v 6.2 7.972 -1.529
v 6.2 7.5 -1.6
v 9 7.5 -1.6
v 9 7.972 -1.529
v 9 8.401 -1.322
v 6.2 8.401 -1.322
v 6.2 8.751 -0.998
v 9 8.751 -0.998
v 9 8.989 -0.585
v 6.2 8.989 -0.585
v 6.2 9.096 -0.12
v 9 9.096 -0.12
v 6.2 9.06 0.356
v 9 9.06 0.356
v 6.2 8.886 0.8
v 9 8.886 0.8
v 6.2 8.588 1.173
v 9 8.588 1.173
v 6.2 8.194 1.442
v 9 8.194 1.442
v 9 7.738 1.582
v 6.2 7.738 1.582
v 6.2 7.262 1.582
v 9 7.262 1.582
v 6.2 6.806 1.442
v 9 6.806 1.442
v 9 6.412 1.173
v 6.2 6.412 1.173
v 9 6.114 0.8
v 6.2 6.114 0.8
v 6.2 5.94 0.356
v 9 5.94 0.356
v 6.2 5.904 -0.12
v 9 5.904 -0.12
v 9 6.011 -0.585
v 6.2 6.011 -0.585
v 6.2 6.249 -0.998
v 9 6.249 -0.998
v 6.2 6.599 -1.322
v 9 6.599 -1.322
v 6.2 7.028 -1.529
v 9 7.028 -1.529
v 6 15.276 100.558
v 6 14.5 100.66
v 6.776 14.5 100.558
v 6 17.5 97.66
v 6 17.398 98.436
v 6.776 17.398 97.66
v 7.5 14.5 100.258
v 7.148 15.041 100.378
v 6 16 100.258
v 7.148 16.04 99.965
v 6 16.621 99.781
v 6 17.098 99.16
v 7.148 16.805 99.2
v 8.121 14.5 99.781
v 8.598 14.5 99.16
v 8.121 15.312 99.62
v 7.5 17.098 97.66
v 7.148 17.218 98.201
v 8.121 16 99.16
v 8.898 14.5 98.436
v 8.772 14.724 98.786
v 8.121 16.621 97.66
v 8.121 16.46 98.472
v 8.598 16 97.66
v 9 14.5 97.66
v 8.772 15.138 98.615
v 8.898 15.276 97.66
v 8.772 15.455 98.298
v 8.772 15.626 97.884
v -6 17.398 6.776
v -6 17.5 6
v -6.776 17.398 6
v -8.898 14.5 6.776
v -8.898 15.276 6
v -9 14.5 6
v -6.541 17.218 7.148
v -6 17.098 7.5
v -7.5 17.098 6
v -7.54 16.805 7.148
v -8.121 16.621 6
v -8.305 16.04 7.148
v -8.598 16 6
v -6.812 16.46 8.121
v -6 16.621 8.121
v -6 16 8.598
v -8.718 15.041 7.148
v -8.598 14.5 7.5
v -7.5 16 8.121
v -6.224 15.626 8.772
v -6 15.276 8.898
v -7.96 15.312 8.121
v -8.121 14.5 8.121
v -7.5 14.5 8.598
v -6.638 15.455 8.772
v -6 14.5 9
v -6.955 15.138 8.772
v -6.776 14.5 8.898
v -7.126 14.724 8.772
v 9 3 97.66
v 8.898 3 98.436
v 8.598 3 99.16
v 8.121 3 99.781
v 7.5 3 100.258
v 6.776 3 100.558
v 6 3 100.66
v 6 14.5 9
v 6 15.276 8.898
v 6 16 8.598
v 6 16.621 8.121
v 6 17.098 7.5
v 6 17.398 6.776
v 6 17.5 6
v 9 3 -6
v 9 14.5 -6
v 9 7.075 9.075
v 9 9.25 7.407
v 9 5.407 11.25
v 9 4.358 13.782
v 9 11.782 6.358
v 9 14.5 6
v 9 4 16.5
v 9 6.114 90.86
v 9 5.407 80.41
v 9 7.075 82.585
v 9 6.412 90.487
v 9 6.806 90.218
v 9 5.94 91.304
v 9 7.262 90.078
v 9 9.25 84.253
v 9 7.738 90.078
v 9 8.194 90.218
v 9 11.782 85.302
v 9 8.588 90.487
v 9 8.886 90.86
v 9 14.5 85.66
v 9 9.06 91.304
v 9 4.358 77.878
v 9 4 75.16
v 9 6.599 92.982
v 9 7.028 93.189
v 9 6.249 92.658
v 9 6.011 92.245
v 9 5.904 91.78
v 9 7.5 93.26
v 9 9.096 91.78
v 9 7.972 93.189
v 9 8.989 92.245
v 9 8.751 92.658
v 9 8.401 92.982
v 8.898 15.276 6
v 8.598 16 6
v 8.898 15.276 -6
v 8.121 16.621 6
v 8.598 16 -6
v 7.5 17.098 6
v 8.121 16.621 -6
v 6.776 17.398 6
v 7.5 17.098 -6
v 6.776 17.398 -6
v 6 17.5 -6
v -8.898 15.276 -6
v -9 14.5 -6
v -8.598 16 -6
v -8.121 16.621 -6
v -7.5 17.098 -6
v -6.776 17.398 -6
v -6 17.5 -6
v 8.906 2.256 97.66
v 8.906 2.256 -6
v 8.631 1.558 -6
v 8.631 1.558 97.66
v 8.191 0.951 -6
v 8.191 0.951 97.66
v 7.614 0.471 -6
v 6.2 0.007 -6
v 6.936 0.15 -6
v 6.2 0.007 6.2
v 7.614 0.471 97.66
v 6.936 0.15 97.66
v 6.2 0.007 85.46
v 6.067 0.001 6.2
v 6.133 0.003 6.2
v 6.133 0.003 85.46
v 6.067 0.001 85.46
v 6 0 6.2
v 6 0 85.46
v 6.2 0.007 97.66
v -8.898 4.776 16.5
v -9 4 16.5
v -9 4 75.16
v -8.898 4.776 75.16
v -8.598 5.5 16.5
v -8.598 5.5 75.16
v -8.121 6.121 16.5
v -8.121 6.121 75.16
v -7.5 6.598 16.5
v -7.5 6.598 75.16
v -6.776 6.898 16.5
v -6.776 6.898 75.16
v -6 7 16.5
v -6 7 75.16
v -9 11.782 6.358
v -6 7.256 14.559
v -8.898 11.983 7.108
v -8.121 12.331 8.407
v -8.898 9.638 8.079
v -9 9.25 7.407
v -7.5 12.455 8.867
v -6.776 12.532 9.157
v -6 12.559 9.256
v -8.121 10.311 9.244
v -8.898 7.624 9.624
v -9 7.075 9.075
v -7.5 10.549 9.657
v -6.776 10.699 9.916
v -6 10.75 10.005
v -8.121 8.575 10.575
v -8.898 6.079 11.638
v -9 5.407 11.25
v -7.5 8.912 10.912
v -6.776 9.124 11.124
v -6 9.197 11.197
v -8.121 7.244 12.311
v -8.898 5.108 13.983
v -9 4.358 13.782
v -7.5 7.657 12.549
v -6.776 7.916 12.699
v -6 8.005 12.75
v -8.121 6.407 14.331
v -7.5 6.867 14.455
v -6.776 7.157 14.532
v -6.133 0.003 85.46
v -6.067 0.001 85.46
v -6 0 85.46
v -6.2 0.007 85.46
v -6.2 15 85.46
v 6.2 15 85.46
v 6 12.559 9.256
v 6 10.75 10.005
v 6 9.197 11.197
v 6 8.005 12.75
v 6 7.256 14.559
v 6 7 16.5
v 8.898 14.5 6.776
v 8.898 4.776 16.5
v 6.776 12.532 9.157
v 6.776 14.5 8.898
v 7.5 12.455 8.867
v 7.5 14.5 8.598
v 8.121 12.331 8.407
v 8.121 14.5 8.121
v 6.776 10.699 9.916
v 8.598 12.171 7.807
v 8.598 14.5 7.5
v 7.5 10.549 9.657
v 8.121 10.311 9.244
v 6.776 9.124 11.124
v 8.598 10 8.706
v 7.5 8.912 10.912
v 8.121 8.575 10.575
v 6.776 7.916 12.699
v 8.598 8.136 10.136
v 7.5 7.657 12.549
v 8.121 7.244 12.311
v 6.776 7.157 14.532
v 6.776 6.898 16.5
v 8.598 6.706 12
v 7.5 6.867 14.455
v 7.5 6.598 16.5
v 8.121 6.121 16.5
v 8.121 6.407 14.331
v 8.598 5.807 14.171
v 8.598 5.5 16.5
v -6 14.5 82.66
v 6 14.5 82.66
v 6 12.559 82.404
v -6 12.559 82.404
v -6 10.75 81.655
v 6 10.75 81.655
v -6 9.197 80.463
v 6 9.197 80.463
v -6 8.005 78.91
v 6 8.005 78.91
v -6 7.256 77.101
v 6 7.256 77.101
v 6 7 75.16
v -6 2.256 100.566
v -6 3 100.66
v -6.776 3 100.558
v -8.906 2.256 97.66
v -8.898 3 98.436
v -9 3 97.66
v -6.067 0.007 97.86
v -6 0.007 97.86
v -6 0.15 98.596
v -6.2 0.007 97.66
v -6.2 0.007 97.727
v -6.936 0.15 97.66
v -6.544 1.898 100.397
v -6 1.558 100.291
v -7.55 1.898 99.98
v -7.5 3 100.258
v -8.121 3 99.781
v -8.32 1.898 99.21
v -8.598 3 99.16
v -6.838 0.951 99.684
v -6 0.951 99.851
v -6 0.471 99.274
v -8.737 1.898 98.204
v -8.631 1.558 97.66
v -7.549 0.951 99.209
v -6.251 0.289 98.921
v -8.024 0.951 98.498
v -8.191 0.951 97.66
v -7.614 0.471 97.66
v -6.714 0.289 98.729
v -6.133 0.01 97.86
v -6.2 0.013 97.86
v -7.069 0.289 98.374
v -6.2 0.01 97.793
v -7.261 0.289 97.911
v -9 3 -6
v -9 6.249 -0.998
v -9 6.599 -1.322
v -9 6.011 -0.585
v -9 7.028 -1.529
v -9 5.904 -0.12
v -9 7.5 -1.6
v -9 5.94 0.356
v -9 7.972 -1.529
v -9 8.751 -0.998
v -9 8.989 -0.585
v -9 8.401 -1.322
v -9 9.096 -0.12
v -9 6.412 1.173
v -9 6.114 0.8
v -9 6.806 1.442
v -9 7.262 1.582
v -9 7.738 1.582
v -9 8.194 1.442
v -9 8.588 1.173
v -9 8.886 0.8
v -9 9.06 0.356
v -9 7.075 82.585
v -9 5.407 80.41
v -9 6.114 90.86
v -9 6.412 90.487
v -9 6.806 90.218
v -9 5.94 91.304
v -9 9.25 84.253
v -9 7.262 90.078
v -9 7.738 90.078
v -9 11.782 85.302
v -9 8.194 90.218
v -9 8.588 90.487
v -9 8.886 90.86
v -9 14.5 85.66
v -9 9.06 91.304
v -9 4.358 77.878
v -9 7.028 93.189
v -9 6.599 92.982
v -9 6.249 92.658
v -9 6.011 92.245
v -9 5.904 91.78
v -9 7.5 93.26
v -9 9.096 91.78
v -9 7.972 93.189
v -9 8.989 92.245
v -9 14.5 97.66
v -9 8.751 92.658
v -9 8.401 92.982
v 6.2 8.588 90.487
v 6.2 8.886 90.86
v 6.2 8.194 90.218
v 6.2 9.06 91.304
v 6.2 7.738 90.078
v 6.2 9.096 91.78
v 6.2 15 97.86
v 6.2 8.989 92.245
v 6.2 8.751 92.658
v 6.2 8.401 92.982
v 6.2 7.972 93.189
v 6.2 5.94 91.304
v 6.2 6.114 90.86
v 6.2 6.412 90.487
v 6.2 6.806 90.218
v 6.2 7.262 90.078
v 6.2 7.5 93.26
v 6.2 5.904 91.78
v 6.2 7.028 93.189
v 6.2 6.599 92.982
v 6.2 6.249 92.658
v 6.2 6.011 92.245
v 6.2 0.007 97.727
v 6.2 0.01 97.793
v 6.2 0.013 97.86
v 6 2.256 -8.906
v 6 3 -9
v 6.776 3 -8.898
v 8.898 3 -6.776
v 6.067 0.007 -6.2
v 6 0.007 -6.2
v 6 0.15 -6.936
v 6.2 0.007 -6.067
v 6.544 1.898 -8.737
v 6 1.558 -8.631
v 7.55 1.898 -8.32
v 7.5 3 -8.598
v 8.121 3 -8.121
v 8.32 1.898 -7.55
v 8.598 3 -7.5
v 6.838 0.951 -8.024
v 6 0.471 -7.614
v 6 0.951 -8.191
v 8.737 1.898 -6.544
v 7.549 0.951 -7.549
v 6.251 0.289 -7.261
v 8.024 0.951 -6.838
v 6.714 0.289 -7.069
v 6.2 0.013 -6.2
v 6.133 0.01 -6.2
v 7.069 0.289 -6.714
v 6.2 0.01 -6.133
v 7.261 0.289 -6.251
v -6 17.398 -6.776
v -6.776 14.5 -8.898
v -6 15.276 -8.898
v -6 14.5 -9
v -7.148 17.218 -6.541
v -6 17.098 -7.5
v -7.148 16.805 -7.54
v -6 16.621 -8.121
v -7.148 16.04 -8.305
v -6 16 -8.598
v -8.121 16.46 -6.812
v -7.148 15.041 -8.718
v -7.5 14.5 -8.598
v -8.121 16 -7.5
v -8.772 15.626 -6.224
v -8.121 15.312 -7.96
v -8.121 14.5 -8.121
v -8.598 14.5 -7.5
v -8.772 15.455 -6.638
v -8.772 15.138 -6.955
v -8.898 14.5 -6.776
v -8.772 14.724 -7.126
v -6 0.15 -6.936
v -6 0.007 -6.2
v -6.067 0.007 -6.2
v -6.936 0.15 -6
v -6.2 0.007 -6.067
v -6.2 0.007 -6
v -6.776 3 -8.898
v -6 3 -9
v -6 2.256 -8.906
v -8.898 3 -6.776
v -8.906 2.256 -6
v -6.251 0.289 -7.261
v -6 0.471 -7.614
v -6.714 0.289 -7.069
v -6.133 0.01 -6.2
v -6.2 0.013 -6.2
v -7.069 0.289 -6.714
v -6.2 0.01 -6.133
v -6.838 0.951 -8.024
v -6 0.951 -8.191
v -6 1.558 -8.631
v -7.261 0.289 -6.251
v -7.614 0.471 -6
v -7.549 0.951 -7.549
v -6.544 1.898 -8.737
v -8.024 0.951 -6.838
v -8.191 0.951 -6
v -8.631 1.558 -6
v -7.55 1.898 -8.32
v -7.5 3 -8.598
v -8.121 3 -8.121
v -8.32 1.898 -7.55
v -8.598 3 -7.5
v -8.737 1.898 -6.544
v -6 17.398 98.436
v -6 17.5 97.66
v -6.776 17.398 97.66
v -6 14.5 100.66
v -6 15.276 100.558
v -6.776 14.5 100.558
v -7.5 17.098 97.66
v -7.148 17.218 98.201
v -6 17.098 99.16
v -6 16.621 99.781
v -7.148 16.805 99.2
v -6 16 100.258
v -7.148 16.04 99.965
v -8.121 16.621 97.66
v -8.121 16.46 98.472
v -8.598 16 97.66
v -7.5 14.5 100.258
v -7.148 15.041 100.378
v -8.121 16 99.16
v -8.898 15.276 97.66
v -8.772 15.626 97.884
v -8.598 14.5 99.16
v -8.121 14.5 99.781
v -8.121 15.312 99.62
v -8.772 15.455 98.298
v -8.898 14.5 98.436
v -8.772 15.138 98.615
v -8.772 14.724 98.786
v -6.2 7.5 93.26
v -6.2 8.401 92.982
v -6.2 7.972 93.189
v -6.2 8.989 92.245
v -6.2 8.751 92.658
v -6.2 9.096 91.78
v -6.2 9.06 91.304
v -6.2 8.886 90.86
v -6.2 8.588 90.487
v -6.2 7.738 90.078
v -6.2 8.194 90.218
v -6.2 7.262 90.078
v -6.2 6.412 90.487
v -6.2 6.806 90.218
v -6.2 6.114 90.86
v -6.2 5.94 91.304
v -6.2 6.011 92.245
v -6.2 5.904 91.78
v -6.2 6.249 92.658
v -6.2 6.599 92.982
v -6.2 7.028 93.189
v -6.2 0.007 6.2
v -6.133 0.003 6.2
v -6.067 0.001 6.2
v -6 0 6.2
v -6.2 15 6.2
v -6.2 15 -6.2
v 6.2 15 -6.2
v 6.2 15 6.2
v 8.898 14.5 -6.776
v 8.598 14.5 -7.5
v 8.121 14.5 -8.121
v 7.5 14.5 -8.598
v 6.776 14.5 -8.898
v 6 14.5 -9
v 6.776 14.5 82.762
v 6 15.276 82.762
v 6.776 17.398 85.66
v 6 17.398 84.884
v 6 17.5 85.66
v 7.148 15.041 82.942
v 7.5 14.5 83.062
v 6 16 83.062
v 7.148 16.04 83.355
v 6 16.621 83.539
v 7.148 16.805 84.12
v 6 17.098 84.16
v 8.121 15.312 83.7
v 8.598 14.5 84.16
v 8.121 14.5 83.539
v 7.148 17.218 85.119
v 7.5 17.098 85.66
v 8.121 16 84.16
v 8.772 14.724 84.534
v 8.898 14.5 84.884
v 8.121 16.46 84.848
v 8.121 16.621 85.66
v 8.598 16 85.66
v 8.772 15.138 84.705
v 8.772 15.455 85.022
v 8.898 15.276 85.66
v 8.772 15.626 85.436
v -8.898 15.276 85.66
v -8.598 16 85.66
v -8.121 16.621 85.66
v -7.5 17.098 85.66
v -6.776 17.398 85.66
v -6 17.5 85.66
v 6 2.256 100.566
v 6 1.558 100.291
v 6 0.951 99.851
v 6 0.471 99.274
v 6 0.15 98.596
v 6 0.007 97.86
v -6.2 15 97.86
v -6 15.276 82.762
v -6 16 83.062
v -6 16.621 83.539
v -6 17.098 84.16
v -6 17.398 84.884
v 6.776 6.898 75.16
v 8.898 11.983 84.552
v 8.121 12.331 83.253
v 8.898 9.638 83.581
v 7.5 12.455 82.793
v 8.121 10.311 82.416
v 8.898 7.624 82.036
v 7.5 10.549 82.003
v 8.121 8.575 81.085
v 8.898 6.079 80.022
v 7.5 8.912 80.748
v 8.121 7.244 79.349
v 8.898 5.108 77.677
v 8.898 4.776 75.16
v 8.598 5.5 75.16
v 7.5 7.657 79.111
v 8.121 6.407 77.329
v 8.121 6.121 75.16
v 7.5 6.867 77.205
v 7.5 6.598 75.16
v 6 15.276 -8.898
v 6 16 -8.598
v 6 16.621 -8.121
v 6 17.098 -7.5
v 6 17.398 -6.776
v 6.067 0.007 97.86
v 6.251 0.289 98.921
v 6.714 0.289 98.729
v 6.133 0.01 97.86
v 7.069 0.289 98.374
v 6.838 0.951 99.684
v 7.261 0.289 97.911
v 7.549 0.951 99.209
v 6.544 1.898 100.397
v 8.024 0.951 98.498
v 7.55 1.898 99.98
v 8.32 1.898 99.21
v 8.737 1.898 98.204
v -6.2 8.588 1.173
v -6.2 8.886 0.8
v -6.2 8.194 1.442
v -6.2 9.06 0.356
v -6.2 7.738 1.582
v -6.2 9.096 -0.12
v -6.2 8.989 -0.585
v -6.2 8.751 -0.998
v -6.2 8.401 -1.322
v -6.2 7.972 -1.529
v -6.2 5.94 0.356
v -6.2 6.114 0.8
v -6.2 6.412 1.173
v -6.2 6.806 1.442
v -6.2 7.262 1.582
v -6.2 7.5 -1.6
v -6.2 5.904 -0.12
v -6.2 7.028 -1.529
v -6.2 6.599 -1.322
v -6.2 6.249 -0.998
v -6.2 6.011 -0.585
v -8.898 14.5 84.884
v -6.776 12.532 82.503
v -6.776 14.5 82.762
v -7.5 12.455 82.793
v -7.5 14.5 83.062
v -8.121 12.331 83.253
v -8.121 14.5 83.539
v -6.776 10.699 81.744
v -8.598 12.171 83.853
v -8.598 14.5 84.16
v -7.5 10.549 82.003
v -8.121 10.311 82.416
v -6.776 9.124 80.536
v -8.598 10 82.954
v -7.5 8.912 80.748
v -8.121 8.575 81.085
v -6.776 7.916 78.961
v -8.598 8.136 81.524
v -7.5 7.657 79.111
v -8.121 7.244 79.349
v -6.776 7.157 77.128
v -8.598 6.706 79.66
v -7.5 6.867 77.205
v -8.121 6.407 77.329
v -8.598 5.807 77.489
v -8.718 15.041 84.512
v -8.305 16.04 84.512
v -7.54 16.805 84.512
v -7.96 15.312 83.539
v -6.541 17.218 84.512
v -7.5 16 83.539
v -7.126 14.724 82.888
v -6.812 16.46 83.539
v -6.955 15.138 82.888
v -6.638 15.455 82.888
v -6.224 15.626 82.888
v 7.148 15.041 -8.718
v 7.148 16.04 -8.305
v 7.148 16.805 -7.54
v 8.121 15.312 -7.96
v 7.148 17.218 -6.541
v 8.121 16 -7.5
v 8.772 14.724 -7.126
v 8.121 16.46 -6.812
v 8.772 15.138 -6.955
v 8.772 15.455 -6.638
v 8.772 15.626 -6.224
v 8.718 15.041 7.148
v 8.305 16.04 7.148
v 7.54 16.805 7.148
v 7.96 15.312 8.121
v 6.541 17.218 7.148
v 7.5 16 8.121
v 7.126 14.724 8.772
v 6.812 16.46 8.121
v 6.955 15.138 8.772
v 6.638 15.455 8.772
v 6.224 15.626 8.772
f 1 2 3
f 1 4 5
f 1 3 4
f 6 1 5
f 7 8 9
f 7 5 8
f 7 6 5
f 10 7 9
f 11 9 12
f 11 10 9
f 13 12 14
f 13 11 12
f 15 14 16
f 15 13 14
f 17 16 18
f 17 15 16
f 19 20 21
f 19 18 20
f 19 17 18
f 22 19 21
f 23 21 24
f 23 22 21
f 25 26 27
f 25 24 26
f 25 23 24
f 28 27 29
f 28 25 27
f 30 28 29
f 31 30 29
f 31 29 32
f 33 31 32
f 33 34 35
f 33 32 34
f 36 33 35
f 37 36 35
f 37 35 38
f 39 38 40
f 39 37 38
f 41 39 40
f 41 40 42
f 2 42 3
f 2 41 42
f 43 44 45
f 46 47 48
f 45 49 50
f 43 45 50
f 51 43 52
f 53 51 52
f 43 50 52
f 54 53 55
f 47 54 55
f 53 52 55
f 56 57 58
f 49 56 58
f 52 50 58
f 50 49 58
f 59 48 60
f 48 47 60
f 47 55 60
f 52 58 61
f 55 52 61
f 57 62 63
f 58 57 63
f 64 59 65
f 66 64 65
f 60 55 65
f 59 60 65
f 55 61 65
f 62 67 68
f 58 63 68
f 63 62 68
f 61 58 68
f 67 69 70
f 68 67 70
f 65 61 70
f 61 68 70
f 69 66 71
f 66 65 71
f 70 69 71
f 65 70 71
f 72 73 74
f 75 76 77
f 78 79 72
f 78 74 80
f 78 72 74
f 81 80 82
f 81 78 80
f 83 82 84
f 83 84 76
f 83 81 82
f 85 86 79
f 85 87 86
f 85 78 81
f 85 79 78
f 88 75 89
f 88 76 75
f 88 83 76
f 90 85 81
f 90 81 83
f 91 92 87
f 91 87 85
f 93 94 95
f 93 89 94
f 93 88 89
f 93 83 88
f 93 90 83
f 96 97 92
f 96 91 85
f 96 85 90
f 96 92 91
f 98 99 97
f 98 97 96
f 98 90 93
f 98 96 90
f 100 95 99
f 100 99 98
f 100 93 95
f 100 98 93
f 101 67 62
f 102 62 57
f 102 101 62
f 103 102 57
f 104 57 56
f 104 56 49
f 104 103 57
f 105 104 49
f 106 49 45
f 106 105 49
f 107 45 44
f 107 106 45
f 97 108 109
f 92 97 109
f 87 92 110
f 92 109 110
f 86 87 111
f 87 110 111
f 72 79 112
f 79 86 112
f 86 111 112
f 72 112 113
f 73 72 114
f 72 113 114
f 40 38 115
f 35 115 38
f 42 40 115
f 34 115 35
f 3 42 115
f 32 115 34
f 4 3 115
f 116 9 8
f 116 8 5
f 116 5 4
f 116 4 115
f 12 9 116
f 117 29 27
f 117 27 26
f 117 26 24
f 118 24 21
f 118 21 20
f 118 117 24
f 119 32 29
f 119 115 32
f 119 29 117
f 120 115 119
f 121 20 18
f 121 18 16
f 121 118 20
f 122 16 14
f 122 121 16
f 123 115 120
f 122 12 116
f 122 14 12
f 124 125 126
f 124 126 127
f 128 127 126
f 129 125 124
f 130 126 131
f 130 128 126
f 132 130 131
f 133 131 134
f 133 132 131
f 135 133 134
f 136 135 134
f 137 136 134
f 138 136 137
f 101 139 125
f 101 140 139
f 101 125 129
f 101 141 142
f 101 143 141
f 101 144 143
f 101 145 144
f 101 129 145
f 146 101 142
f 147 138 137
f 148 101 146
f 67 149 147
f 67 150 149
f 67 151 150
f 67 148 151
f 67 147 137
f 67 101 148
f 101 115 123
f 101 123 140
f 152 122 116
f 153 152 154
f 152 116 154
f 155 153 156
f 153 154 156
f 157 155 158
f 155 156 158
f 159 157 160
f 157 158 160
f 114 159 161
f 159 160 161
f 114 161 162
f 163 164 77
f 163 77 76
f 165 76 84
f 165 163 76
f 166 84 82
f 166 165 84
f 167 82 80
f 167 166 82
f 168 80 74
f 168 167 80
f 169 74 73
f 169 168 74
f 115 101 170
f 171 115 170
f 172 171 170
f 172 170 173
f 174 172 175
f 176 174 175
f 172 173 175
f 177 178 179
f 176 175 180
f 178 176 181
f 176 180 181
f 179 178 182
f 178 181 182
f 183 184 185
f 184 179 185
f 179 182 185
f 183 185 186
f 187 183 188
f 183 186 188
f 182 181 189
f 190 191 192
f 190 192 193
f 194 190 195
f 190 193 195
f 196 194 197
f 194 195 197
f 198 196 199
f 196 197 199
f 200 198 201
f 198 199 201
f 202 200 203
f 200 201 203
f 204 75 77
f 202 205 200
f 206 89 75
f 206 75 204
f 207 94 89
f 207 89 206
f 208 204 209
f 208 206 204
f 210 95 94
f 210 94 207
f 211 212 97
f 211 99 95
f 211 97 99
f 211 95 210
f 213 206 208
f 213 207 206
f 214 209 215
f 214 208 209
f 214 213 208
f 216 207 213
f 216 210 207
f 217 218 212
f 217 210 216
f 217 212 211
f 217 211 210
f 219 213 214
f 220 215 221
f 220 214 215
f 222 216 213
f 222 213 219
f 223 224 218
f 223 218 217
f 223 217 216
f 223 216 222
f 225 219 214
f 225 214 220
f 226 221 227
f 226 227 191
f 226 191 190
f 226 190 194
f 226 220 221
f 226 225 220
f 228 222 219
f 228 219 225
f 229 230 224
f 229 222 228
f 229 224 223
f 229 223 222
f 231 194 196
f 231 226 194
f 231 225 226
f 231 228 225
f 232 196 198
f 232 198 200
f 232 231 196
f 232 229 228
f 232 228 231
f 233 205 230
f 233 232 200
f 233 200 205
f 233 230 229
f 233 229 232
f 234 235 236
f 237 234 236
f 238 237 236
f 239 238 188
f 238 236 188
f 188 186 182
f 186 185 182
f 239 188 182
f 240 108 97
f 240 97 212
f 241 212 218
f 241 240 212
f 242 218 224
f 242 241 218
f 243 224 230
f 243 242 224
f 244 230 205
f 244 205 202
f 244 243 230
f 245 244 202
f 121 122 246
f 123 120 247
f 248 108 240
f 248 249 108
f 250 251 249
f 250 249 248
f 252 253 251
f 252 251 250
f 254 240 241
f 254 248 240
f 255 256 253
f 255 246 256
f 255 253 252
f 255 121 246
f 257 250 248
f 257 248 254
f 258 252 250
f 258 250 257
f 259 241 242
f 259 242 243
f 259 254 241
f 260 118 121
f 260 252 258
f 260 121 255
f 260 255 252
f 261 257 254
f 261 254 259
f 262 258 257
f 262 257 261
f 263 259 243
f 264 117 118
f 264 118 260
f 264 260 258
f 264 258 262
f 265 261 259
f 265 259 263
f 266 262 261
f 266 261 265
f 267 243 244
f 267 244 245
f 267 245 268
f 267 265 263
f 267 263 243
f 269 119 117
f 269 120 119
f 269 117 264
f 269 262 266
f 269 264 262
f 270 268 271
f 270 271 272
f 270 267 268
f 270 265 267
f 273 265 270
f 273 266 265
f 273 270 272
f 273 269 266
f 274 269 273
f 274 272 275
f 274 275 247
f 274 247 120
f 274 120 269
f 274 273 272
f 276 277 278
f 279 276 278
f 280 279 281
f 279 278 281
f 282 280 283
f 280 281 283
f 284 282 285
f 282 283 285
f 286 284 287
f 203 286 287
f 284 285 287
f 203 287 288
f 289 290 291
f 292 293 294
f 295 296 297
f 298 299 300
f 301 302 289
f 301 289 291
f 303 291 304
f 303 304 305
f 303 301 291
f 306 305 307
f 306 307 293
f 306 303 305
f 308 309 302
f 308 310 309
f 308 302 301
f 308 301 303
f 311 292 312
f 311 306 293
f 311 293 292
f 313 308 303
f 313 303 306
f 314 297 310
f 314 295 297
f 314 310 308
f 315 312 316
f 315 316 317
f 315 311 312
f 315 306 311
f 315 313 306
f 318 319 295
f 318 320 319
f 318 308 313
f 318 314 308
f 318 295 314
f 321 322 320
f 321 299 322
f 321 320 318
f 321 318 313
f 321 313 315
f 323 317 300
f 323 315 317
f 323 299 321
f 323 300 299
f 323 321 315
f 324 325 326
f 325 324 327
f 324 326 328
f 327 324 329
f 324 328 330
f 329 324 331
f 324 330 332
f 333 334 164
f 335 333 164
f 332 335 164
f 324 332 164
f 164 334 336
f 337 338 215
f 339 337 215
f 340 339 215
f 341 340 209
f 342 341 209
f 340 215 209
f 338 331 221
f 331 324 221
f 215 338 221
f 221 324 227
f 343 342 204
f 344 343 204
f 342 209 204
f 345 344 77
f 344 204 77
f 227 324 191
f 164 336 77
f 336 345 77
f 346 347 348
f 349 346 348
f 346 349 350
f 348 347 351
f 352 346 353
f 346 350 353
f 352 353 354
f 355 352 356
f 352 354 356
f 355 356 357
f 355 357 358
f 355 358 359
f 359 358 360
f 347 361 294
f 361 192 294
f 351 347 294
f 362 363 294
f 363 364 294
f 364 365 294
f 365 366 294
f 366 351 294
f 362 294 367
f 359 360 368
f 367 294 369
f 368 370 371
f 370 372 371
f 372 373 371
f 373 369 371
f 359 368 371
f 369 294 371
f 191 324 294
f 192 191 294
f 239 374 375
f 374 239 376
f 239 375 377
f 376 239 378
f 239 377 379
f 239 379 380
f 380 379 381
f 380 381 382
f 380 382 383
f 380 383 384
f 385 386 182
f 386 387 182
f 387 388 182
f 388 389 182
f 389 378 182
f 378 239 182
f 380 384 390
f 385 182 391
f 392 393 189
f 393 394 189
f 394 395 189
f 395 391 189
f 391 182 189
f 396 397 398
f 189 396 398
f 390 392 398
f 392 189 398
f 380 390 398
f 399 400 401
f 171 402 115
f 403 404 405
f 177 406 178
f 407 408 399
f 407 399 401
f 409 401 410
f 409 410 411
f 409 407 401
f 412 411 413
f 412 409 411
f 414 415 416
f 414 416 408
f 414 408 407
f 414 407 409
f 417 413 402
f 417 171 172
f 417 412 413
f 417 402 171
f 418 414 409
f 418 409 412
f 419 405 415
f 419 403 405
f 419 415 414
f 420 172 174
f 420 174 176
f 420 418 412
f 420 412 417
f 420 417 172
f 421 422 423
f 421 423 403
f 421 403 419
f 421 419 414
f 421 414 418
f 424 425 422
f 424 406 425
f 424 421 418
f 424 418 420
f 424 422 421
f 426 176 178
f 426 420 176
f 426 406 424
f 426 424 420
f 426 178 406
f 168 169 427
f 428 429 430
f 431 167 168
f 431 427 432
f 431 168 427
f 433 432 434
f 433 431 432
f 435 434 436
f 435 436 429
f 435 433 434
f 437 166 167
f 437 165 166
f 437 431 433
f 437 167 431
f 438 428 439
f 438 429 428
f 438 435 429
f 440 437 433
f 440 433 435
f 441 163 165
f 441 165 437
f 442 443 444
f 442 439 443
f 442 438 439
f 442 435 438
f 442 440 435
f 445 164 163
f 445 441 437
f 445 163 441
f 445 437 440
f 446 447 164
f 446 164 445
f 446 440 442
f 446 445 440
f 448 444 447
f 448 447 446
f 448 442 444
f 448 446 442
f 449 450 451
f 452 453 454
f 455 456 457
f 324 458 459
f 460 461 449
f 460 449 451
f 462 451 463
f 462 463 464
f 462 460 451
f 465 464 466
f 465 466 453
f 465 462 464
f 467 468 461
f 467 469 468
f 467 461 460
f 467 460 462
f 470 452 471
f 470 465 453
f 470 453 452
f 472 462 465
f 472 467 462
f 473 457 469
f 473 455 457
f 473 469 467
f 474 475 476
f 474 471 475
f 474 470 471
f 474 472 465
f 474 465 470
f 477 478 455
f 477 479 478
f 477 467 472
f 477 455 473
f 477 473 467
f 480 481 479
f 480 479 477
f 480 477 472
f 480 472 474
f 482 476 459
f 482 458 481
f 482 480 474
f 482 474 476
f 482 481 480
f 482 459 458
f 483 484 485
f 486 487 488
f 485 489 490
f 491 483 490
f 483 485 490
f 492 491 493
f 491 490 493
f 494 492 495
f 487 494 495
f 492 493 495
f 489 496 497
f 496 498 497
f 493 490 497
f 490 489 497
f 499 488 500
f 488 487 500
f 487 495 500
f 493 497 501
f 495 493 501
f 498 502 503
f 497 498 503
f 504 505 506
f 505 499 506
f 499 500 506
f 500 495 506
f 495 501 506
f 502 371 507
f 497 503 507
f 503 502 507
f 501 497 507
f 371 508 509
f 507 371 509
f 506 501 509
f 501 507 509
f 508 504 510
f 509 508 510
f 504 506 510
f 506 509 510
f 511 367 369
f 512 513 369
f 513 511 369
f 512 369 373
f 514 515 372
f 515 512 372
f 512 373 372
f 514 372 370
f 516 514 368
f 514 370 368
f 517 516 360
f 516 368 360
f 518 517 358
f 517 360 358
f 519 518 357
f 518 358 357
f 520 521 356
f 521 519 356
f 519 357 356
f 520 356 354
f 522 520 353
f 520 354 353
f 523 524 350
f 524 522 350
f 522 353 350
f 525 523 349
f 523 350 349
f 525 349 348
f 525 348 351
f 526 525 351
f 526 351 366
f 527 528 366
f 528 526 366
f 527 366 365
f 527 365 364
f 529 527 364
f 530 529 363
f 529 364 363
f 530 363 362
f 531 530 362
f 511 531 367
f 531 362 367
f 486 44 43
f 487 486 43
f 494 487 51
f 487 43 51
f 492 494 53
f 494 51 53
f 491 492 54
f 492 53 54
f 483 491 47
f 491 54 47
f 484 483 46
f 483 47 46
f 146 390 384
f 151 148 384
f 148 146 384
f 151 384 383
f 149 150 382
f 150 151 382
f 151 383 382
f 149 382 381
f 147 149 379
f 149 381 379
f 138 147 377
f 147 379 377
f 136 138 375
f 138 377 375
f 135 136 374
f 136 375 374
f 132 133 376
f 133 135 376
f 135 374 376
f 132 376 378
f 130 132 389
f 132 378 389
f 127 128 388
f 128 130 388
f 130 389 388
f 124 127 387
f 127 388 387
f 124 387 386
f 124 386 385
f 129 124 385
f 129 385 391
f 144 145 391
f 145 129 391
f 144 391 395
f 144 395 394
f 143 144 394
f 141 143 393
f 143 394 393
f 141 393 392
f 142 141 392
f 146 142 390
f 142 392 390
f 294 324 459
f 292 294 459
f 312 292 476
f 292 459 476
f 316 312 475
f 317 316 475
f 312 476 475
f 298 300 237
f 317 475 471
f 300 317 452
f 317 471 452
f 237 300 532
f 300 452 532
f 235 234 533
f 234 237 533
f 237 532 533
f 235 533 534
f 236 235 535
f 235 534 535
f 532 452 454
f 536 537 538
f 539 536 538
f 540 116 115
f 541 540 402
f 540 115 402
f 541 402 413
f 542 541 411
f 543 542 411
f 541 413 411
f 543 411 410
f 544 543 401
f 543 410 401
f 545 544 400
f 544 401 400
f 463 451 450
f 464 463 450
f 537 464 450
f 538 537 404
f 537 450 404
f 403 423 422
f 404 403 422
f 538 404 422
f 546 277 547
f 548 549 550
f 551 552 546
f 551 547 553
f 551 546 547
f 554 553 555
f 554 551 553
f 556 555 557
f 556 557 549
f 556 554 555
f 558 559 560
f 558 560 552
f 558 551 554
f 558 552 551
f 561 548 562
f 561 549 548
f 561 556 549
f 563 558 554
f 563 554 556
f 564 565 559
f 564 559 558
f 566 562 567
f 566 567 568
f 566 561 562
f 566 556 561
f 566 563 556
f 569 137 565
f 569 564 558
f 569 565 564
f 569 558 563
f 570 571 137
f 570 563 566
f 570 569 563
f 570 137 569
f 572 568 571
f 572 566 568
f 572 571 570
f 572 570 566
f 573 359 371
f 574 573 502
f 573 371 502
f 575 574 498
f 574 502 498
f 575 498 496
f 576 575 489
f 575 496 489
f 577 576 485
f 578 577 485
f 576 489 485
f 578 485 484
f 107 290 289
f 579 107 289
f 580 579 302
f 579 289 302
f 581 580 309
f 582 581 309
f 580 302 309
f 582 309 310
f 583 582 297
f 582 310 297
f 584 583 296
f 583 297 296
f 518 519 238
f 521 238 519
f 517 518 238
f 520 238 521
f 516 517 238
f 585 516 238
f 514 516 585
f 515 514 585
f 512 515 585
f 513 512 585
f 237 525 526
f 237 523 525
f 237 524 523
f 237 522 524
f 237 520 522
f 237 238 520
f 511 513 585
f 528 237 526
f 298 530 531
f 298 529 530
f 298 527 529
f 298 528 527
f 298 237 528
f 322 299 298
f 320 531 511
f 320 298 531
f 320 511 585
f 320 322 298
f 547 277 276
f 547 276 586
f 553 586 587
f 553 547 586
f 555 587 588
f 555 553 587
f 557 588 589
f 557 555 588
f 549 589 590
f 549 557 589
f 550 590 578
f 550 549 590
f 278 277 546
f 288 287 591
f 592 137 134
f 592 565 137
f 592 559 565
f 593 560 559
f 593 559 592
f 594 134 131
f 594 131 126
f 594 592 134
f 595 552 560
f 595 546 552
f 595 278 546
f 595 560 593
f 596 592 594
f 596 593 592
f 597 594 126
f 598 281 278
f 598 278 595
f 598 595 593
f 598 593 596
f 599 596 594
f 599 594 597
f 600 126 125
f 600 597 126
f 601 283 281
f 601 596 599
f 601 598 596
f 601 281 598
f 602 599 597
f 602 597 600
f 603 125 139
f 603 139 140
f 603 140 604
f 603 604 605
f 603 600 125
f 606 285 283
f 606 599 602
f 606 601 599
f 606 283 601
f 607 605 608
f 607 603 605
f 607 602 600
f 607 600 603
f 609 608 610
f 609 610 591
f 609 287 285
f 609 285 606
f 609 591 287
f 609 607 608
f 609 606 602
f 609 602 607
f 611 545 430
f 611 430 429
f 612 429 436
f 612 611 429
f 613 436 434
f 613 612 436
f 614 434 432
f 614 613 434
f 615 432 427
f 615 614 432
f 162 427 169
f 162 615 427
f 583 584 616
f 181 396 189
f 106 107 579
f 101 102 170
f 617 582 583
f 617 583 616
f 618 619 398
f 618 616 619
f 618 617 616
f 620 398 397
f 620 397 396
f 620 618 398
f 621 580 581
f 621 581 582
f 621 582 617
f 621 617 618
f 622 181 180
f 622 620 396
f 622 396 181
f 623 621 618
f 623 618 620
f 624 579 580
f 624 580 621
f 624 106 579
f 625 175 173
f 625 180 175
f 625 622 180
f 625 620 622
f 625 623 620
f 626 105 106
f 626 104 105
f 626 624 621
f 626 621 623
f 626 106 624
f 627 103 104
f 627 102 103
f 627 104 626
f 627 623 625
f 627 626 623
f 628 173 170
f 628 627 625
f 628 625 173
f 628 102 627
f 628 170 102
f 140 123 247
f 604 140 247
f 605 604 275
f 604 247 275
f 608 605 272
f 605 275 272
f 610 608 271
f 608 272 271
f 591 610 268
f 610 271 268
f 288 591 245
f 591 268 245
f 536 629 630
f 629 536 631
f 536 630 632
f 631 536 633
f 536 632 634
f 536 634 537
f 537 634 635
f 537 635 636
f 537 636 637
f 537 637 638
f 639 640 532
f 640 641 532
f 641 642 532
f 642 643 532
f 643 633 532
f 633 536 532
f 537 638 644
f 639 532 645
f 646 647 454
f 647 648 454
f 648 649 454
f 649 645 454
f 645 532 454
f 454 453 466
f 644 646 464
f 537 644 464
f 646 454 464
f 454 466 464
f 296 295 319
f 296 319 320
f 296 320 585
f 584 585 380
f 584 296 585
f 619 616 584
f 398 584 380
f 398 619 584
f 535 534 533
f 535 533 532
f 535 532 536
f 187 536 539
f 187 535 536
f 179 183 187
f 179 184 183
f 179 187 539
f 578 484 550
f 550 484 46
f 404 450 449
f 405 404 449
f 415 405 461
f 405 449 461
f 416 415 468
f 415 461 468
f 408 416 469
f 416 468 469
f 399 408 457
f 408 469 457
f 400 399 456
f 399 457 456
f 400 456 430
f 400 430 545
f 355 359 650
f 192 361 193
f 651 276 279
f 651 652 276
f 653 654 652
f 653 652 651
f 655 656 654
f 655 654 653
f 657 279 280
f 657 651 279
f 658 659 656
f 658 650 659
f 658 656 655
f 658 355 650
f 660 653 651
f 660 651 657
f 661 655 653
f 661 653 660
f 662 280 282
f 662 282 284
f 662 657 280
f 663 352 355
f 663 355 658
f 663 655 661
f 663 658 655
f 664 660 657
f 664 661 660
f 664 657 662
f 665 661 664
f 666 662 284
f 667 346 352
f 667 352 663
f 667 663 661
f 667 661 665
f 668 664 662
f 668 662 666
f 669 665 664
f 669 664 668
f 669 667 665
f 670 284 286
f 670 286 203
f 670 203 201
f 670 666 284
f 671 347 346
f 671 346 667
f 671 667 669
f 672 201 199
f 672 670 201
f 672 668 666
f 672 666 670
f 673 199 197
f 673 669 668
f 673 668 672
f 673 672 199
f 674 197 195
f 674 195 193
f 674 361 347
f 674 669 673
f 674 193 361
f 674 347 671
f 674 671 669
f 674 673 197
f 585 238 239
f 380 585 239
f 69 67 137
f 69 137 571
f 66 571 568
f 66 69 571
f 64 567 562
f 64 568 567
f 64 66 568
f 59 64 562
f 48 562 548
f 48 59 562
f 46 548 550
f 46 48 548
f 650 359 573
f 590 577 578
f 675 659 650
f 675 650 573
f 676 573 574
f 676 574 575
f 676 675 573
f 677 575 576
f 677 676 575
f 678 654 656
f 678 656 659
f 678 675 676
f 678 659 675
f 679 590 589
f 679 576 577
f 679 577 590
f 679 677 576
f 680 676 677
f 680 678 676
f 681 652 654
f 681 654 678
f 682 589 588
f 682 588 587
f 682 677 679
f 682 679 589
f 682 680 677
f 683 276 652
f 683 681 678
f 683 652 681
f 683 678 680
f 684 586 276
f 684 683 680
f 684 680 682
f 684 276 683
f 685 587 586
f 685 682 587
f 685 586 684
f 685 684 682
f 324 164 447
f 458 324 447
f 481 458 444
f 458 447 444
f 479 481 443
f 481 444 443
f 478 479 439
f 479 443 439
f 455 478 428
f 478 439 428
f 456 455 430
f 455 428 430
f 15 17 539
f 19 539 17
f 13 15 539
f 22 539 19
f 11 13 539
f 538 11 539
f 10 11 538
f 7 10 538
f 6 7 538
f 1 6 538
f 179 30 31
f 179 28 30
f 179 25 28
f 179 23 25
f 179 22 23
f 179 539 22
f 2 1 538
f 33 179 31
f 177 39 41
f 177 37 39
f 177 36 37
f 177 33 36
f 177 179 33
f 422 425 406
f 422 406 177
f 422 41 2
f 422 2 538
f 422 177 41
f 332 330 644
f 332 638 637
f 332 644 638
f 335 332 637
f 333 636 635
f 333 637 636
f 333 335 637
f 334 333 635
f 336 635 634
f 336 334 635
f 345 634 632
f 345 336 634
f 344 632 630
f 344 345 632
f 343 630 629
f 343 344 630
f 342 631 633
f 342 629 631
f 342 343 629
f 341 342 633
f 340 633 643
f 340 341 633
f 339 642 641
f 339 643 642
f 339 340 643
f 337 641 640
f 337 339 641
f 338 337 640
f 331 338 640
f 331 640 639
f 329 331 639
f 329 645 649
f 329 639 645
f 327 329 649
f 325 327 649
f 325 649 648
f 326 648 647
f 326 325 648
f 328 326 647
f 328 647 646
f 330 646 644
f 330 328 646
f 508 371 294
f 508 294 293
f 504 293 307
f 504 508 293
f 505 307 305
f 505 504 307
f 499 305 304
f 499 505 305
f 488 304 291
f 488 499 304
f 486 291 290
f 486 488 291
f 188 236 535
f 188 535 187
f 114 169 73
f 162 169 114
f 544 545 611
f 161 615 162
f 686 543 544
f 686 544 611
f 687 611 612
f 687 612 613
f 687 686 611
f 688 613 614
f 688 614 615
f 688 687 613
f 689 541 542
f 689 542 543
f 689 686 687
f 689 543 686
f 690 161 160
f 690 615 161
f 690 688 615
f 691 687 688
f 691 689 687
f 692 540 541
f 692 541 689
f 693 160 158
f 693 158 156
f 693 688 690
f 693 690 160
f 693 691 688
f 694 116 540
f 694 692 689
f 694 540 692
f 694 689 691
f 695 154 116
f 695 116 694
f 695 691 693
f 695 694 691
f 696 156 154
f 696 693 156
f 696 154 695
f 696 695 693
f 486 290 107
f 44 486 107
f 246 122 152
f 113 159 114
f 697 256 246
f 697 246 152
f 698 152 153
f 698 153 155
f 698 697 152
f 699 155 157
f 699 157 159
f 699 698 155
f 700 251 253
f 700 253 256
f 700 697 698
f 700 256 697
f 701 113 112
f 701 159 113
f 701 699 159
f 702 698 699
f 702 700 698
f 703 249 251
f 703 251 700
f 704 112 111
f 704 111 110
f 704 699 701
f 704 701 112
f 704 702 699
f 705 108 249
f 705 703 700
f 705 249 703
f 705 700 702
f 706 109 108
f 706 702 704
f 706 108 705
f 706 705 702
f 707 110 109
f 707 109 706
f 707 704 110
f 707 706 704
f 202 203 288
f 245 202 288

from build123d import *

# Parameters (mm, degrees)
SKETCH_1_W               = 18
SKETCH_1_H               = 18
SKETCH_1_W_2             = 12.4
SKETCH_1_H_2             = 12.4
EXTRUDE_1_DEPTH          = 15
SKETCH_2_W               = 18
SKETCH_2_H               = 18
EXTRUDE_1_2_DEPTH        = 2.5
FILLET_1_R               = 3
SKETCH_3_W               = 18
SKETCH_3_H               = 7
EXTRUDE_2_DEPTH          = 36.83
FILLET_2_R               = 7.5
FILLET_3_R               = 3
CUT_EXTRUDE_1_DEPTH      = 37
CUT_EXTRUDE_1_DEPTH_BACK = 37
SKETCH_6_R               = 1.6
FILLET_4_R               = 3


# Some blends are built 0.0001 mm under size
with BuildPart() as part:
    # 草图1 → Extrude 1 (new body)
    with BuildSketch(Plane(origin=(0, 0, 0), x_dir=(1, 0, 0), z_dir=(0, 1, 0))):
        Rectangle(SKETCH_1_W, SKETCH_1_H)
        Rectangle(SKETCH_1_W_2, SKETCH_1_H_2, mode=Mode.SUBTRACT)
    extrude(amount=EXTRUDE_1_DEPTH)

    # 草图2 → Extrude 1 2 (add)
    with BuildSketch(Plane(origin=(0, 15, 0), x_dir=(1, 0, 0), z_dir=(0, 1, 0))):
        Rectangle(SKETCH_2_W, SKETCH_2_H)
    extrude(amount=EXTRUDE_1_2_DEPTH)

    # 圆角1
    fillet_1_edges = [part.edges().sort_by_distance(p)[0] for p in [
        (-9, 17.5, 0),
        (0, 17.5, 9),
        (9, 17.5, 0),
        (0, 17.5, -9),
    ]]
    fillet(fillet_1_edges, radius=FILLET_1_R)

    # 草图3 → 凸台-拉伸2 (add)
    with BuildSketch(Plane.XY.offset(9)):
        with Locations((0, 3.5)):
            Rectangle(SKETCH_3_W, SKETCH_3_H)
    extrude(amount=EXTRUDE_2_DEPTH)

    # 圆角2
    fillet_2_edges = [part.edges().sort_by_distance(p)[0] for p in [
        (0, 7, 9),
    ]]
    fillet(fillet_2_edges, radius=FILLET_2_R - 0.0001)  # a hair under: the kernel refuses the full size

    # 圆角3
    # the kernel refuses this fillet: 3 mm, written as the material it takes off along each edge
    with BuildSketch(Plane(origin=(6, 14.5, -6), x_dir=(0, 0, -1), z_dir=(1, 0, 0))) as fillet_3_piece_1_section:
        Polygon((0, 0), (FILLET_3_R, 0), (FILLET_3_R, FILLET_3_R), (0, FILLET_3_R), align=None)
    fillet_3_piece_1 = extrude(amount=FILLET_3_R, mode=Mode.PRIVATE)
    fillet_3_piece_1 = fillet_3_piece_1 - Plane(origin=(6, 14.5, -6), x_dir=(0, -0.7071067811865475, 0.7071067811865475), z_dir=(1, 0, 0)) * Sphere(FILLET_3_R, mode=Mode.PRIVATE)
    add(fillet_3_piece_1, mode=Mode.SUBTRACT)
    with BuildSketch(Plane(origin=(-6, 14.5, -6), x_dir=(0, 0, -1), z_dir=(-1, 0, 0))) as fillet_3_piece_2_section:
        Polygon((0, 0), (FILLET_3_R, 0), (FILLET_3_R, -FILLET_3_R), (0, -FILLET_3_R), align=None)
    fillet_3_piece_2 = extrude(amount=FILLET_3_R, mode=Mode.PRIVATE)
    fillet_3_piece_2 = fillet_3_piece_2 - Plane(origin=(-6, 14.5, -6), x_dir=(0, -0.7071067811865475, 0.7071067811865475), z_dir=(-1, 0, 0)) * Sphere(FILLET_3_R, mode=Mode.PRIVATE)
    add(fillet_3_piece_2, mode=Mode.SUBTRACT)
    with BuildSketch(Plane(origin=(-9, 14.5, -9), x_dir=(0, 0, 1), z_dir=(0, -1, 0)), Plane(origin=(9, -7.5, -9), x_dir=(0, 0, 1), z_dir=(0, 1, 0))) as fillet_3_piece_3:
        with BuildLine():
            CenterArc((FILLET_3_R, -FILLET_3_R), FILLET_3_R, 90, 90)
            Line((0, -FILLET_3_R), (0, 0))
            Line((0, 0), (FILLET_3_R, 0))
        make_face()
    extrude(amount=22, mode=Mode.SUBTRACT)

    # 草图6 → 切除-拉伸1 (cut, two sides: drawn at the far end of the back side and taken through both)
    with BuildSketch(Plane(origin=(-6.2, 0, 0), x_dir=(0, 0, -1), z_dir=(1, 0, 0)).offset(-CUT_EXTRUDE_1_DEPTH_BACK)):
        with Locations((0, 7.5)):
            Circle(SKETCH_6_R)
    extrude(amount=CUT_EXTRUDE_1_DEPTH + CUT_EXTRUDE_1_DEPTH_BACK, mode=Mode.SUBTRACT)

    # 镜向1: part across plane


with BuildPart() as part_1:
    add(part.part)
    add(part.part.mirror(Plane(origin=(0, 0, 45.83), x_dir=(1, 0, 0), z_dir=(0, 0, -1))))

    # 圆角4
    # the kernel refuses this fillet: 3 mm, written as the material it takes off along each edge
    with BuildSketch(Plane(origin=(6, 14.5, 85.66), x_dir=(0, 0, -1), z_dir=(1, 0, 0))) as fillet_4_piece_1_section:
        Polygon((0, 0), (FILLET_4_R, 0), (FILLET_4_R, FILLET_4_R), (0, FILLET_4_R), align=None)
    fillet_4_piece_1 = extrude(amount=FILLET_4_R, mode=Mode.PRIVATE)
    fillet_4_piece_1 = fillet_4_piece_1 - Plane(origin=(6, 14.5, 85.66), x_dir=(0, -0.7071067811865475, 0.7071067811865475), z_dir=(1, 0, 0)) * Sphere(FILLET_4_R, mode=Mode.PRIVATE)
    add(fillet_4_piece_1, mode=Mode.SUBTRACT)
    with BuildSketch(Plane(origin=(6, 14.5, 6), x_dir=(1, 0, 0), z_dir=(0, 0, 1))) as fillet_4_piece_2_section:
        Polygon((0, 0), (FILLET_4_R, 0), (FILLET_4_R, FILLET_4_R), (0, FILLET_4_R), align=None)
    fillet_4_piece_2 = extrude(amount=FILLET_4_R, mode=Mode.PRIVATE)
    fillet_4_piece_2 = fillet_4_piece_2 - Plane(origin=(6, 14.5, 6), x_dir=(-0.7071067811865475, -0.7071067811865475, 0), z_dir=(0, 0, 1)) * Sphere(FILLET_4_R, mode=Mode.PRIVATE)
    add(fillet_4_piece_2, mode=Mode.SUBTRACT)
    with BuildSketch(Plane(origin=(-6, 14.5, 85.66), x_dir=(-1, 0, 0), z_dir=(0, 0, -1))) as fillet_4_piece_3_section:
        Polygon((0, 0), (FILLET_4_R, 0), (FILLET_4_R, FILLET_4_R), (0, FILLET_4_R), align=None)
    fillet_4_piece_3 = extrude(amount=FILLET_4_R, mode=Mode.PRIVATE)
    fillet_4_piece_3 = fillet_4_piece_3 - Plane(origin=(-6, 14.5, 85.66), x_dir=(0.7071067811865475, -0.7071067811865475, 0), z_dir=(0, 0, -1)) * Sphere(FILLET_4_R, mode=Mode.PRIVATE)
    add(fillet_4_piece_3, mode=Mode.SUBTRACT)
    with BuildSketch(Plane(origin=(-6, 14.5, 6), x_dir=(-1, 0, 0), z_dir=(0, 0, 1))) as fillet_4_piece_4_section:
        Polygon((0, 0), (FILLET_4_R, 0), (FILLET_4_R, -FILLET_4_R), (0, -FILLET_4_R), align=None)
    fillet_4_piece_4 = extrude(amount=FILLET_4_R, mode=Mode.PRIVATE)
    fillet_4_piece_4 = fillet_4_piece_4 - Plane(origin=(-6, 14.5, 6), x_dir=(0.7071067811865475, -0.7071067811865475, 0), z_dir=(0, 0, 1)) * Sphere(FILLET_4_R, mode=Mode.PRIVATE)
    add(fillet_4_piece_4, mode=Mode.SUBTRACT)
    with BuildSketch(Plane(origin=(9, 14.4999, 75.1601), x_dir=(0, 0, 1), z_dir=(0, 1, 0))) as fillet_4_piece_5:
        with BuildLine():
            CenterArc((7.4999 + FILLET_4_R, -FILLET_4_R), FILLET_4_R, 90, 90)
            Line((7.4999, -FILLET_4_R), (7.4999, 0))
            Line((7.4999, 0), (7.4999 + FILLET_4_R, 0))
        make_face()
    revolve(axis=Axis((9, 14.4999, 75.1601), (1, 0, 0)), revolution_arc=90, mode=Mode.SUBTRACT)
    with BuildSketch(Plane(origin=(-9, 14.4999, 75.1601), x_dir=(0, 0, 1), z_dir=(0, 1, 0))) as fillet_4_piece_6:
        with BuildLine():
            CenterArc((7.4999 + FILLET_4_R, FILLET_4_R), FILLET_4_R, 180, 90)
            Line((7.4999 + FILLET_4_R, 0), (7.4999, 0))
            Line((7.4999, 0), (7.4999, FILLET_4_R))
        make_face()
    revolve(axis=Axis((-9, 14.4999, 75.1601), (1, 0, 0)), revolution_arc=90, mode=Mode.SUBTRACT)
    with BuildSketch(Plane(origin=(9, 14.4999, 16.4999), x_dir=(0, 0, -1), z_dir=(0, 1, 0))) as fillet_4_piece_7:
        with BuildLine():
            CenterArc((7.4999 + FILLET_4_R, FILLET_4_R), FILLET_4_R, 180, 90)
            Line((7.4999, FILLET_4_R), (7.4999, 0))
            Line((7.4999, 0), (7.4999 + FILLET_4_R, 0))
        make_face()
    revolve(axis=Axis((9, 14.4999, 16.4999), (-1, 0, 0)), revolution_arc=90, mode=Mode.SUBTRACT)
    with BuildSketch(Plane(origin=(-9, 14.4999, 16.4999), x_dir=(0, 0, -1), z_dir=(0, 1, 0))) as fillet_4_piece_8:
        with BuildLine():
            CenterArc((7.4999 + FILLET_4_R, -FILLET_4_R), FILLET_4_R, 90, 90)
            Line((7.4999 + FILLET_4_R, 0), (7.4999, 0))
            Line((7.4999, 0), (7.4999, -FILLET_4_R))
        make_face()
    revolve(axis=Axis((-9, 14.4999, 16.4999), (-1, 0, 0)), revolution_arc=90, mode=Mode.SUBTRACT)
    with BuildSketch(Plane(origin=(9, 0, 97.66), x_dir=(0, 1, 0), z_dir=(0, 0, -1))) as fillet_4_piece_9:
        with BuildLine():
            CenterArc((FILLET_4_R, -FILLET_4_R), FILLET_4_R, 90, 90)
            Line((0, -FILLET_4_R), (0, 0))
            Line((0, 0), (FILLET_4_R, 0))
        make_face()
    extrude(amount=103.66, mode=Mode.SUBTRACT)
    with BuildSketch(Plane(origin=(-9, 0, -6), x_dir=(1, 0, 0), z_dir=(0, 0, 1))) as fillet_4_piece_10:
        with BuildLine():
            CenterArc((FILLET_4_R, FILLET_4_R), FILLET_4_R, 180, 90)
            Line((0, FILLET_4_R), (0, 0))
            Line((0, 0), (FILLET_4_R, 0))
        make_face()
    extrude(amount=103.66, mode=Mode.SUBTRACT)
    with BuildSketch(Plane(origin=(9, 7, 16.4999), x_dir=(0, -1, 0), z_dir=(0, 0, 1))) as fillet_4_piece_11:
        with BuildLine():
            CenterArc((FILLET_4_R, -FILLET_4_R), FILLET_4_R, 90, 90)
            Line((0, -FILLET_4_R), (0, 0))
            Line((0, 0), (FILLET_4_R, 0))
        make_face()
    extrude(amount=58.6602, mode=Mode.SUBTRACT)
    with BuildSketch(Plane(origin=(-9, 7, 75.1601), x_dir=(1, 0, 0), z_dir=(0, 0, -1))) as fillet_4_piece_12:
        with BuildLine():
            CenterArc((FILLET_4_R, FILLET_4_R), FILLET_4_R, 180, 90)
            Line((0, FILLET_4_R), (0, 0))
            Line((0, 0), (FILLET_4_R, 0))
        make_face()
    extrude(amount=58.6602, mode=Mode.SUBTRACT)
    with BuildSketch(Plane(origin=(-6, 0, -6), x_dir=(0, 0, -1), z_dir=(1, 0, 0))) as fillet_4_piece_13:
        with BuildLine():
            CenterArc((3 - FILLET_4_R, FILLET_4_R), FILLET_4_R, 270, 90)
            Line((3 - FILLET_4_R, 0), (3, 0))
            Line((3, 0), (3, FILLET_4_R))
        make_face()
    revolve(axis=Axis((-6, 0, -6), (0, 1, 0)), revolution_arc=90, mode=Mode.SUBTRACT)
    with BuildSketch(Plane(origin=(-6, 0, 97.66), x_dir=(0, 0, 1), z_dir=(1, 0, 0))) as fillet_4_piece_14:
        with BuildLine():
            CenterArc((3 - FILLET_4_R, -FILLET_4_R), FILLET_4_R, 0, 90)
            Line((3, -FILLET_4_R), (3, 0))
            Line((3, 0), (3 - FILLET_4_R, 0))
        make_face()
    revolve(axis=Axis((-6, 0, 97.66), (0, -1, 0)), revolution_arc=90, mode=Mode.SUBTRACT)
    with BuildSketch(Plane(origin=(-6, 0, 100.66), x_dir=(0, 0, -1), z_dir=(1, 0, 0)), Plane(origin=(-6, 0, -9), x_dir=(0, 1, 0), z_dir=(1, 0, 0))) as fillet_4_piece_15:
        with BuildLine():
            CenterArc((FILLET_4_R, FILLET_4_R), FILLET_4_R, 180, 90)
            Line((0, FILLET_4_R), (0, 0))
            Line((0, 0), (FILLET_4_R, 0))
        make_face()
    extrude(amount=12, mode=Mode.SUBTRACT)
    with BuildSketch(Plane(origin=(6, 0, 97.66), x_dir=(0, 0, 1), z_dir=(-1, 0, 0))) as fillet_4_piece_16:
        with BuildLine():
            CenterArc((3 - FILLET_4_R, FILLET_4_R), FILLET_4_R, 270, 90)
            Line((3, FILLET_4_R), (3, 0))
            Line((3, 0), (3 - FILLET_4_R, 0))
        make_face()
    revolve(axis=Axis((6, 0, 97.66), (0, 1, 0)), revolution_arc=90, mode=Mode.SUBTRACT)
    with BuildSketch(Plane(origin=(6, 0, -6), x_dir=(0, 0, -1), z_dir=(-1, 0, 0))) as fillet_4_piece_17:
        with BuildLine():
            CenterArc((3 - FILLET_4_R, -FILLET_4_R), FILLET_4_R, 0, 90)
            Line((3 - FILLET_4_R, 0), (3, 0))
            Line((3, 0), (3, -FILLET_4_R))
        make_face()
    revolve(axis=Axis((6, 0, -6), (0, -1, 0)), revolution_arc=90, mode=Mode.SUBTRACT)
    with BuildSketch(Plane(origin=(-9, 14.5, 9), x_dir=(1, 0, 0), z_dir=(0, -1, 0)), Plane(origin=(9, 14.4999, 9), x_dir=(-1, 0, 0), z_dir=(0, 1, 0)), Plane(origin=(9, 14.4999, 82.66), x_dir=(0, 0, 1), z_dir=(0, 1, 0))) as fillet_4_piece_18:
        with BuildLine():
            CenterArc((FILLET_4_R, -FILLET_4_R), FILLET_4_R, 90, 90)
            Line((0, -FILLET_4_R), (0, 0))
            Line((0, 0), (FILLET_4_R, 0))
        make_face()
    extrude(amount=0.0001, mode=Mode.SUBTRACT)
    with BuildSketch(Plane(origin=(-9, 14.5, 82.66), x_dir=(1, 0, 0), z_dir=(0, -1, 0))) as fillet_4_piece_19:
        with BuildLine():
            CenterArc((FILLET_4_R, FILLET_4_R), FILLET_4_R, 180, 90)
            Line((0, FILLET_4_R), (0, 0))
            Line((0, 0), (FILLET_4_R, 0))
        make_face()
    extrude(amount=0.0001, mode=Mode.SUBTRACT)


solid = part_1.part
